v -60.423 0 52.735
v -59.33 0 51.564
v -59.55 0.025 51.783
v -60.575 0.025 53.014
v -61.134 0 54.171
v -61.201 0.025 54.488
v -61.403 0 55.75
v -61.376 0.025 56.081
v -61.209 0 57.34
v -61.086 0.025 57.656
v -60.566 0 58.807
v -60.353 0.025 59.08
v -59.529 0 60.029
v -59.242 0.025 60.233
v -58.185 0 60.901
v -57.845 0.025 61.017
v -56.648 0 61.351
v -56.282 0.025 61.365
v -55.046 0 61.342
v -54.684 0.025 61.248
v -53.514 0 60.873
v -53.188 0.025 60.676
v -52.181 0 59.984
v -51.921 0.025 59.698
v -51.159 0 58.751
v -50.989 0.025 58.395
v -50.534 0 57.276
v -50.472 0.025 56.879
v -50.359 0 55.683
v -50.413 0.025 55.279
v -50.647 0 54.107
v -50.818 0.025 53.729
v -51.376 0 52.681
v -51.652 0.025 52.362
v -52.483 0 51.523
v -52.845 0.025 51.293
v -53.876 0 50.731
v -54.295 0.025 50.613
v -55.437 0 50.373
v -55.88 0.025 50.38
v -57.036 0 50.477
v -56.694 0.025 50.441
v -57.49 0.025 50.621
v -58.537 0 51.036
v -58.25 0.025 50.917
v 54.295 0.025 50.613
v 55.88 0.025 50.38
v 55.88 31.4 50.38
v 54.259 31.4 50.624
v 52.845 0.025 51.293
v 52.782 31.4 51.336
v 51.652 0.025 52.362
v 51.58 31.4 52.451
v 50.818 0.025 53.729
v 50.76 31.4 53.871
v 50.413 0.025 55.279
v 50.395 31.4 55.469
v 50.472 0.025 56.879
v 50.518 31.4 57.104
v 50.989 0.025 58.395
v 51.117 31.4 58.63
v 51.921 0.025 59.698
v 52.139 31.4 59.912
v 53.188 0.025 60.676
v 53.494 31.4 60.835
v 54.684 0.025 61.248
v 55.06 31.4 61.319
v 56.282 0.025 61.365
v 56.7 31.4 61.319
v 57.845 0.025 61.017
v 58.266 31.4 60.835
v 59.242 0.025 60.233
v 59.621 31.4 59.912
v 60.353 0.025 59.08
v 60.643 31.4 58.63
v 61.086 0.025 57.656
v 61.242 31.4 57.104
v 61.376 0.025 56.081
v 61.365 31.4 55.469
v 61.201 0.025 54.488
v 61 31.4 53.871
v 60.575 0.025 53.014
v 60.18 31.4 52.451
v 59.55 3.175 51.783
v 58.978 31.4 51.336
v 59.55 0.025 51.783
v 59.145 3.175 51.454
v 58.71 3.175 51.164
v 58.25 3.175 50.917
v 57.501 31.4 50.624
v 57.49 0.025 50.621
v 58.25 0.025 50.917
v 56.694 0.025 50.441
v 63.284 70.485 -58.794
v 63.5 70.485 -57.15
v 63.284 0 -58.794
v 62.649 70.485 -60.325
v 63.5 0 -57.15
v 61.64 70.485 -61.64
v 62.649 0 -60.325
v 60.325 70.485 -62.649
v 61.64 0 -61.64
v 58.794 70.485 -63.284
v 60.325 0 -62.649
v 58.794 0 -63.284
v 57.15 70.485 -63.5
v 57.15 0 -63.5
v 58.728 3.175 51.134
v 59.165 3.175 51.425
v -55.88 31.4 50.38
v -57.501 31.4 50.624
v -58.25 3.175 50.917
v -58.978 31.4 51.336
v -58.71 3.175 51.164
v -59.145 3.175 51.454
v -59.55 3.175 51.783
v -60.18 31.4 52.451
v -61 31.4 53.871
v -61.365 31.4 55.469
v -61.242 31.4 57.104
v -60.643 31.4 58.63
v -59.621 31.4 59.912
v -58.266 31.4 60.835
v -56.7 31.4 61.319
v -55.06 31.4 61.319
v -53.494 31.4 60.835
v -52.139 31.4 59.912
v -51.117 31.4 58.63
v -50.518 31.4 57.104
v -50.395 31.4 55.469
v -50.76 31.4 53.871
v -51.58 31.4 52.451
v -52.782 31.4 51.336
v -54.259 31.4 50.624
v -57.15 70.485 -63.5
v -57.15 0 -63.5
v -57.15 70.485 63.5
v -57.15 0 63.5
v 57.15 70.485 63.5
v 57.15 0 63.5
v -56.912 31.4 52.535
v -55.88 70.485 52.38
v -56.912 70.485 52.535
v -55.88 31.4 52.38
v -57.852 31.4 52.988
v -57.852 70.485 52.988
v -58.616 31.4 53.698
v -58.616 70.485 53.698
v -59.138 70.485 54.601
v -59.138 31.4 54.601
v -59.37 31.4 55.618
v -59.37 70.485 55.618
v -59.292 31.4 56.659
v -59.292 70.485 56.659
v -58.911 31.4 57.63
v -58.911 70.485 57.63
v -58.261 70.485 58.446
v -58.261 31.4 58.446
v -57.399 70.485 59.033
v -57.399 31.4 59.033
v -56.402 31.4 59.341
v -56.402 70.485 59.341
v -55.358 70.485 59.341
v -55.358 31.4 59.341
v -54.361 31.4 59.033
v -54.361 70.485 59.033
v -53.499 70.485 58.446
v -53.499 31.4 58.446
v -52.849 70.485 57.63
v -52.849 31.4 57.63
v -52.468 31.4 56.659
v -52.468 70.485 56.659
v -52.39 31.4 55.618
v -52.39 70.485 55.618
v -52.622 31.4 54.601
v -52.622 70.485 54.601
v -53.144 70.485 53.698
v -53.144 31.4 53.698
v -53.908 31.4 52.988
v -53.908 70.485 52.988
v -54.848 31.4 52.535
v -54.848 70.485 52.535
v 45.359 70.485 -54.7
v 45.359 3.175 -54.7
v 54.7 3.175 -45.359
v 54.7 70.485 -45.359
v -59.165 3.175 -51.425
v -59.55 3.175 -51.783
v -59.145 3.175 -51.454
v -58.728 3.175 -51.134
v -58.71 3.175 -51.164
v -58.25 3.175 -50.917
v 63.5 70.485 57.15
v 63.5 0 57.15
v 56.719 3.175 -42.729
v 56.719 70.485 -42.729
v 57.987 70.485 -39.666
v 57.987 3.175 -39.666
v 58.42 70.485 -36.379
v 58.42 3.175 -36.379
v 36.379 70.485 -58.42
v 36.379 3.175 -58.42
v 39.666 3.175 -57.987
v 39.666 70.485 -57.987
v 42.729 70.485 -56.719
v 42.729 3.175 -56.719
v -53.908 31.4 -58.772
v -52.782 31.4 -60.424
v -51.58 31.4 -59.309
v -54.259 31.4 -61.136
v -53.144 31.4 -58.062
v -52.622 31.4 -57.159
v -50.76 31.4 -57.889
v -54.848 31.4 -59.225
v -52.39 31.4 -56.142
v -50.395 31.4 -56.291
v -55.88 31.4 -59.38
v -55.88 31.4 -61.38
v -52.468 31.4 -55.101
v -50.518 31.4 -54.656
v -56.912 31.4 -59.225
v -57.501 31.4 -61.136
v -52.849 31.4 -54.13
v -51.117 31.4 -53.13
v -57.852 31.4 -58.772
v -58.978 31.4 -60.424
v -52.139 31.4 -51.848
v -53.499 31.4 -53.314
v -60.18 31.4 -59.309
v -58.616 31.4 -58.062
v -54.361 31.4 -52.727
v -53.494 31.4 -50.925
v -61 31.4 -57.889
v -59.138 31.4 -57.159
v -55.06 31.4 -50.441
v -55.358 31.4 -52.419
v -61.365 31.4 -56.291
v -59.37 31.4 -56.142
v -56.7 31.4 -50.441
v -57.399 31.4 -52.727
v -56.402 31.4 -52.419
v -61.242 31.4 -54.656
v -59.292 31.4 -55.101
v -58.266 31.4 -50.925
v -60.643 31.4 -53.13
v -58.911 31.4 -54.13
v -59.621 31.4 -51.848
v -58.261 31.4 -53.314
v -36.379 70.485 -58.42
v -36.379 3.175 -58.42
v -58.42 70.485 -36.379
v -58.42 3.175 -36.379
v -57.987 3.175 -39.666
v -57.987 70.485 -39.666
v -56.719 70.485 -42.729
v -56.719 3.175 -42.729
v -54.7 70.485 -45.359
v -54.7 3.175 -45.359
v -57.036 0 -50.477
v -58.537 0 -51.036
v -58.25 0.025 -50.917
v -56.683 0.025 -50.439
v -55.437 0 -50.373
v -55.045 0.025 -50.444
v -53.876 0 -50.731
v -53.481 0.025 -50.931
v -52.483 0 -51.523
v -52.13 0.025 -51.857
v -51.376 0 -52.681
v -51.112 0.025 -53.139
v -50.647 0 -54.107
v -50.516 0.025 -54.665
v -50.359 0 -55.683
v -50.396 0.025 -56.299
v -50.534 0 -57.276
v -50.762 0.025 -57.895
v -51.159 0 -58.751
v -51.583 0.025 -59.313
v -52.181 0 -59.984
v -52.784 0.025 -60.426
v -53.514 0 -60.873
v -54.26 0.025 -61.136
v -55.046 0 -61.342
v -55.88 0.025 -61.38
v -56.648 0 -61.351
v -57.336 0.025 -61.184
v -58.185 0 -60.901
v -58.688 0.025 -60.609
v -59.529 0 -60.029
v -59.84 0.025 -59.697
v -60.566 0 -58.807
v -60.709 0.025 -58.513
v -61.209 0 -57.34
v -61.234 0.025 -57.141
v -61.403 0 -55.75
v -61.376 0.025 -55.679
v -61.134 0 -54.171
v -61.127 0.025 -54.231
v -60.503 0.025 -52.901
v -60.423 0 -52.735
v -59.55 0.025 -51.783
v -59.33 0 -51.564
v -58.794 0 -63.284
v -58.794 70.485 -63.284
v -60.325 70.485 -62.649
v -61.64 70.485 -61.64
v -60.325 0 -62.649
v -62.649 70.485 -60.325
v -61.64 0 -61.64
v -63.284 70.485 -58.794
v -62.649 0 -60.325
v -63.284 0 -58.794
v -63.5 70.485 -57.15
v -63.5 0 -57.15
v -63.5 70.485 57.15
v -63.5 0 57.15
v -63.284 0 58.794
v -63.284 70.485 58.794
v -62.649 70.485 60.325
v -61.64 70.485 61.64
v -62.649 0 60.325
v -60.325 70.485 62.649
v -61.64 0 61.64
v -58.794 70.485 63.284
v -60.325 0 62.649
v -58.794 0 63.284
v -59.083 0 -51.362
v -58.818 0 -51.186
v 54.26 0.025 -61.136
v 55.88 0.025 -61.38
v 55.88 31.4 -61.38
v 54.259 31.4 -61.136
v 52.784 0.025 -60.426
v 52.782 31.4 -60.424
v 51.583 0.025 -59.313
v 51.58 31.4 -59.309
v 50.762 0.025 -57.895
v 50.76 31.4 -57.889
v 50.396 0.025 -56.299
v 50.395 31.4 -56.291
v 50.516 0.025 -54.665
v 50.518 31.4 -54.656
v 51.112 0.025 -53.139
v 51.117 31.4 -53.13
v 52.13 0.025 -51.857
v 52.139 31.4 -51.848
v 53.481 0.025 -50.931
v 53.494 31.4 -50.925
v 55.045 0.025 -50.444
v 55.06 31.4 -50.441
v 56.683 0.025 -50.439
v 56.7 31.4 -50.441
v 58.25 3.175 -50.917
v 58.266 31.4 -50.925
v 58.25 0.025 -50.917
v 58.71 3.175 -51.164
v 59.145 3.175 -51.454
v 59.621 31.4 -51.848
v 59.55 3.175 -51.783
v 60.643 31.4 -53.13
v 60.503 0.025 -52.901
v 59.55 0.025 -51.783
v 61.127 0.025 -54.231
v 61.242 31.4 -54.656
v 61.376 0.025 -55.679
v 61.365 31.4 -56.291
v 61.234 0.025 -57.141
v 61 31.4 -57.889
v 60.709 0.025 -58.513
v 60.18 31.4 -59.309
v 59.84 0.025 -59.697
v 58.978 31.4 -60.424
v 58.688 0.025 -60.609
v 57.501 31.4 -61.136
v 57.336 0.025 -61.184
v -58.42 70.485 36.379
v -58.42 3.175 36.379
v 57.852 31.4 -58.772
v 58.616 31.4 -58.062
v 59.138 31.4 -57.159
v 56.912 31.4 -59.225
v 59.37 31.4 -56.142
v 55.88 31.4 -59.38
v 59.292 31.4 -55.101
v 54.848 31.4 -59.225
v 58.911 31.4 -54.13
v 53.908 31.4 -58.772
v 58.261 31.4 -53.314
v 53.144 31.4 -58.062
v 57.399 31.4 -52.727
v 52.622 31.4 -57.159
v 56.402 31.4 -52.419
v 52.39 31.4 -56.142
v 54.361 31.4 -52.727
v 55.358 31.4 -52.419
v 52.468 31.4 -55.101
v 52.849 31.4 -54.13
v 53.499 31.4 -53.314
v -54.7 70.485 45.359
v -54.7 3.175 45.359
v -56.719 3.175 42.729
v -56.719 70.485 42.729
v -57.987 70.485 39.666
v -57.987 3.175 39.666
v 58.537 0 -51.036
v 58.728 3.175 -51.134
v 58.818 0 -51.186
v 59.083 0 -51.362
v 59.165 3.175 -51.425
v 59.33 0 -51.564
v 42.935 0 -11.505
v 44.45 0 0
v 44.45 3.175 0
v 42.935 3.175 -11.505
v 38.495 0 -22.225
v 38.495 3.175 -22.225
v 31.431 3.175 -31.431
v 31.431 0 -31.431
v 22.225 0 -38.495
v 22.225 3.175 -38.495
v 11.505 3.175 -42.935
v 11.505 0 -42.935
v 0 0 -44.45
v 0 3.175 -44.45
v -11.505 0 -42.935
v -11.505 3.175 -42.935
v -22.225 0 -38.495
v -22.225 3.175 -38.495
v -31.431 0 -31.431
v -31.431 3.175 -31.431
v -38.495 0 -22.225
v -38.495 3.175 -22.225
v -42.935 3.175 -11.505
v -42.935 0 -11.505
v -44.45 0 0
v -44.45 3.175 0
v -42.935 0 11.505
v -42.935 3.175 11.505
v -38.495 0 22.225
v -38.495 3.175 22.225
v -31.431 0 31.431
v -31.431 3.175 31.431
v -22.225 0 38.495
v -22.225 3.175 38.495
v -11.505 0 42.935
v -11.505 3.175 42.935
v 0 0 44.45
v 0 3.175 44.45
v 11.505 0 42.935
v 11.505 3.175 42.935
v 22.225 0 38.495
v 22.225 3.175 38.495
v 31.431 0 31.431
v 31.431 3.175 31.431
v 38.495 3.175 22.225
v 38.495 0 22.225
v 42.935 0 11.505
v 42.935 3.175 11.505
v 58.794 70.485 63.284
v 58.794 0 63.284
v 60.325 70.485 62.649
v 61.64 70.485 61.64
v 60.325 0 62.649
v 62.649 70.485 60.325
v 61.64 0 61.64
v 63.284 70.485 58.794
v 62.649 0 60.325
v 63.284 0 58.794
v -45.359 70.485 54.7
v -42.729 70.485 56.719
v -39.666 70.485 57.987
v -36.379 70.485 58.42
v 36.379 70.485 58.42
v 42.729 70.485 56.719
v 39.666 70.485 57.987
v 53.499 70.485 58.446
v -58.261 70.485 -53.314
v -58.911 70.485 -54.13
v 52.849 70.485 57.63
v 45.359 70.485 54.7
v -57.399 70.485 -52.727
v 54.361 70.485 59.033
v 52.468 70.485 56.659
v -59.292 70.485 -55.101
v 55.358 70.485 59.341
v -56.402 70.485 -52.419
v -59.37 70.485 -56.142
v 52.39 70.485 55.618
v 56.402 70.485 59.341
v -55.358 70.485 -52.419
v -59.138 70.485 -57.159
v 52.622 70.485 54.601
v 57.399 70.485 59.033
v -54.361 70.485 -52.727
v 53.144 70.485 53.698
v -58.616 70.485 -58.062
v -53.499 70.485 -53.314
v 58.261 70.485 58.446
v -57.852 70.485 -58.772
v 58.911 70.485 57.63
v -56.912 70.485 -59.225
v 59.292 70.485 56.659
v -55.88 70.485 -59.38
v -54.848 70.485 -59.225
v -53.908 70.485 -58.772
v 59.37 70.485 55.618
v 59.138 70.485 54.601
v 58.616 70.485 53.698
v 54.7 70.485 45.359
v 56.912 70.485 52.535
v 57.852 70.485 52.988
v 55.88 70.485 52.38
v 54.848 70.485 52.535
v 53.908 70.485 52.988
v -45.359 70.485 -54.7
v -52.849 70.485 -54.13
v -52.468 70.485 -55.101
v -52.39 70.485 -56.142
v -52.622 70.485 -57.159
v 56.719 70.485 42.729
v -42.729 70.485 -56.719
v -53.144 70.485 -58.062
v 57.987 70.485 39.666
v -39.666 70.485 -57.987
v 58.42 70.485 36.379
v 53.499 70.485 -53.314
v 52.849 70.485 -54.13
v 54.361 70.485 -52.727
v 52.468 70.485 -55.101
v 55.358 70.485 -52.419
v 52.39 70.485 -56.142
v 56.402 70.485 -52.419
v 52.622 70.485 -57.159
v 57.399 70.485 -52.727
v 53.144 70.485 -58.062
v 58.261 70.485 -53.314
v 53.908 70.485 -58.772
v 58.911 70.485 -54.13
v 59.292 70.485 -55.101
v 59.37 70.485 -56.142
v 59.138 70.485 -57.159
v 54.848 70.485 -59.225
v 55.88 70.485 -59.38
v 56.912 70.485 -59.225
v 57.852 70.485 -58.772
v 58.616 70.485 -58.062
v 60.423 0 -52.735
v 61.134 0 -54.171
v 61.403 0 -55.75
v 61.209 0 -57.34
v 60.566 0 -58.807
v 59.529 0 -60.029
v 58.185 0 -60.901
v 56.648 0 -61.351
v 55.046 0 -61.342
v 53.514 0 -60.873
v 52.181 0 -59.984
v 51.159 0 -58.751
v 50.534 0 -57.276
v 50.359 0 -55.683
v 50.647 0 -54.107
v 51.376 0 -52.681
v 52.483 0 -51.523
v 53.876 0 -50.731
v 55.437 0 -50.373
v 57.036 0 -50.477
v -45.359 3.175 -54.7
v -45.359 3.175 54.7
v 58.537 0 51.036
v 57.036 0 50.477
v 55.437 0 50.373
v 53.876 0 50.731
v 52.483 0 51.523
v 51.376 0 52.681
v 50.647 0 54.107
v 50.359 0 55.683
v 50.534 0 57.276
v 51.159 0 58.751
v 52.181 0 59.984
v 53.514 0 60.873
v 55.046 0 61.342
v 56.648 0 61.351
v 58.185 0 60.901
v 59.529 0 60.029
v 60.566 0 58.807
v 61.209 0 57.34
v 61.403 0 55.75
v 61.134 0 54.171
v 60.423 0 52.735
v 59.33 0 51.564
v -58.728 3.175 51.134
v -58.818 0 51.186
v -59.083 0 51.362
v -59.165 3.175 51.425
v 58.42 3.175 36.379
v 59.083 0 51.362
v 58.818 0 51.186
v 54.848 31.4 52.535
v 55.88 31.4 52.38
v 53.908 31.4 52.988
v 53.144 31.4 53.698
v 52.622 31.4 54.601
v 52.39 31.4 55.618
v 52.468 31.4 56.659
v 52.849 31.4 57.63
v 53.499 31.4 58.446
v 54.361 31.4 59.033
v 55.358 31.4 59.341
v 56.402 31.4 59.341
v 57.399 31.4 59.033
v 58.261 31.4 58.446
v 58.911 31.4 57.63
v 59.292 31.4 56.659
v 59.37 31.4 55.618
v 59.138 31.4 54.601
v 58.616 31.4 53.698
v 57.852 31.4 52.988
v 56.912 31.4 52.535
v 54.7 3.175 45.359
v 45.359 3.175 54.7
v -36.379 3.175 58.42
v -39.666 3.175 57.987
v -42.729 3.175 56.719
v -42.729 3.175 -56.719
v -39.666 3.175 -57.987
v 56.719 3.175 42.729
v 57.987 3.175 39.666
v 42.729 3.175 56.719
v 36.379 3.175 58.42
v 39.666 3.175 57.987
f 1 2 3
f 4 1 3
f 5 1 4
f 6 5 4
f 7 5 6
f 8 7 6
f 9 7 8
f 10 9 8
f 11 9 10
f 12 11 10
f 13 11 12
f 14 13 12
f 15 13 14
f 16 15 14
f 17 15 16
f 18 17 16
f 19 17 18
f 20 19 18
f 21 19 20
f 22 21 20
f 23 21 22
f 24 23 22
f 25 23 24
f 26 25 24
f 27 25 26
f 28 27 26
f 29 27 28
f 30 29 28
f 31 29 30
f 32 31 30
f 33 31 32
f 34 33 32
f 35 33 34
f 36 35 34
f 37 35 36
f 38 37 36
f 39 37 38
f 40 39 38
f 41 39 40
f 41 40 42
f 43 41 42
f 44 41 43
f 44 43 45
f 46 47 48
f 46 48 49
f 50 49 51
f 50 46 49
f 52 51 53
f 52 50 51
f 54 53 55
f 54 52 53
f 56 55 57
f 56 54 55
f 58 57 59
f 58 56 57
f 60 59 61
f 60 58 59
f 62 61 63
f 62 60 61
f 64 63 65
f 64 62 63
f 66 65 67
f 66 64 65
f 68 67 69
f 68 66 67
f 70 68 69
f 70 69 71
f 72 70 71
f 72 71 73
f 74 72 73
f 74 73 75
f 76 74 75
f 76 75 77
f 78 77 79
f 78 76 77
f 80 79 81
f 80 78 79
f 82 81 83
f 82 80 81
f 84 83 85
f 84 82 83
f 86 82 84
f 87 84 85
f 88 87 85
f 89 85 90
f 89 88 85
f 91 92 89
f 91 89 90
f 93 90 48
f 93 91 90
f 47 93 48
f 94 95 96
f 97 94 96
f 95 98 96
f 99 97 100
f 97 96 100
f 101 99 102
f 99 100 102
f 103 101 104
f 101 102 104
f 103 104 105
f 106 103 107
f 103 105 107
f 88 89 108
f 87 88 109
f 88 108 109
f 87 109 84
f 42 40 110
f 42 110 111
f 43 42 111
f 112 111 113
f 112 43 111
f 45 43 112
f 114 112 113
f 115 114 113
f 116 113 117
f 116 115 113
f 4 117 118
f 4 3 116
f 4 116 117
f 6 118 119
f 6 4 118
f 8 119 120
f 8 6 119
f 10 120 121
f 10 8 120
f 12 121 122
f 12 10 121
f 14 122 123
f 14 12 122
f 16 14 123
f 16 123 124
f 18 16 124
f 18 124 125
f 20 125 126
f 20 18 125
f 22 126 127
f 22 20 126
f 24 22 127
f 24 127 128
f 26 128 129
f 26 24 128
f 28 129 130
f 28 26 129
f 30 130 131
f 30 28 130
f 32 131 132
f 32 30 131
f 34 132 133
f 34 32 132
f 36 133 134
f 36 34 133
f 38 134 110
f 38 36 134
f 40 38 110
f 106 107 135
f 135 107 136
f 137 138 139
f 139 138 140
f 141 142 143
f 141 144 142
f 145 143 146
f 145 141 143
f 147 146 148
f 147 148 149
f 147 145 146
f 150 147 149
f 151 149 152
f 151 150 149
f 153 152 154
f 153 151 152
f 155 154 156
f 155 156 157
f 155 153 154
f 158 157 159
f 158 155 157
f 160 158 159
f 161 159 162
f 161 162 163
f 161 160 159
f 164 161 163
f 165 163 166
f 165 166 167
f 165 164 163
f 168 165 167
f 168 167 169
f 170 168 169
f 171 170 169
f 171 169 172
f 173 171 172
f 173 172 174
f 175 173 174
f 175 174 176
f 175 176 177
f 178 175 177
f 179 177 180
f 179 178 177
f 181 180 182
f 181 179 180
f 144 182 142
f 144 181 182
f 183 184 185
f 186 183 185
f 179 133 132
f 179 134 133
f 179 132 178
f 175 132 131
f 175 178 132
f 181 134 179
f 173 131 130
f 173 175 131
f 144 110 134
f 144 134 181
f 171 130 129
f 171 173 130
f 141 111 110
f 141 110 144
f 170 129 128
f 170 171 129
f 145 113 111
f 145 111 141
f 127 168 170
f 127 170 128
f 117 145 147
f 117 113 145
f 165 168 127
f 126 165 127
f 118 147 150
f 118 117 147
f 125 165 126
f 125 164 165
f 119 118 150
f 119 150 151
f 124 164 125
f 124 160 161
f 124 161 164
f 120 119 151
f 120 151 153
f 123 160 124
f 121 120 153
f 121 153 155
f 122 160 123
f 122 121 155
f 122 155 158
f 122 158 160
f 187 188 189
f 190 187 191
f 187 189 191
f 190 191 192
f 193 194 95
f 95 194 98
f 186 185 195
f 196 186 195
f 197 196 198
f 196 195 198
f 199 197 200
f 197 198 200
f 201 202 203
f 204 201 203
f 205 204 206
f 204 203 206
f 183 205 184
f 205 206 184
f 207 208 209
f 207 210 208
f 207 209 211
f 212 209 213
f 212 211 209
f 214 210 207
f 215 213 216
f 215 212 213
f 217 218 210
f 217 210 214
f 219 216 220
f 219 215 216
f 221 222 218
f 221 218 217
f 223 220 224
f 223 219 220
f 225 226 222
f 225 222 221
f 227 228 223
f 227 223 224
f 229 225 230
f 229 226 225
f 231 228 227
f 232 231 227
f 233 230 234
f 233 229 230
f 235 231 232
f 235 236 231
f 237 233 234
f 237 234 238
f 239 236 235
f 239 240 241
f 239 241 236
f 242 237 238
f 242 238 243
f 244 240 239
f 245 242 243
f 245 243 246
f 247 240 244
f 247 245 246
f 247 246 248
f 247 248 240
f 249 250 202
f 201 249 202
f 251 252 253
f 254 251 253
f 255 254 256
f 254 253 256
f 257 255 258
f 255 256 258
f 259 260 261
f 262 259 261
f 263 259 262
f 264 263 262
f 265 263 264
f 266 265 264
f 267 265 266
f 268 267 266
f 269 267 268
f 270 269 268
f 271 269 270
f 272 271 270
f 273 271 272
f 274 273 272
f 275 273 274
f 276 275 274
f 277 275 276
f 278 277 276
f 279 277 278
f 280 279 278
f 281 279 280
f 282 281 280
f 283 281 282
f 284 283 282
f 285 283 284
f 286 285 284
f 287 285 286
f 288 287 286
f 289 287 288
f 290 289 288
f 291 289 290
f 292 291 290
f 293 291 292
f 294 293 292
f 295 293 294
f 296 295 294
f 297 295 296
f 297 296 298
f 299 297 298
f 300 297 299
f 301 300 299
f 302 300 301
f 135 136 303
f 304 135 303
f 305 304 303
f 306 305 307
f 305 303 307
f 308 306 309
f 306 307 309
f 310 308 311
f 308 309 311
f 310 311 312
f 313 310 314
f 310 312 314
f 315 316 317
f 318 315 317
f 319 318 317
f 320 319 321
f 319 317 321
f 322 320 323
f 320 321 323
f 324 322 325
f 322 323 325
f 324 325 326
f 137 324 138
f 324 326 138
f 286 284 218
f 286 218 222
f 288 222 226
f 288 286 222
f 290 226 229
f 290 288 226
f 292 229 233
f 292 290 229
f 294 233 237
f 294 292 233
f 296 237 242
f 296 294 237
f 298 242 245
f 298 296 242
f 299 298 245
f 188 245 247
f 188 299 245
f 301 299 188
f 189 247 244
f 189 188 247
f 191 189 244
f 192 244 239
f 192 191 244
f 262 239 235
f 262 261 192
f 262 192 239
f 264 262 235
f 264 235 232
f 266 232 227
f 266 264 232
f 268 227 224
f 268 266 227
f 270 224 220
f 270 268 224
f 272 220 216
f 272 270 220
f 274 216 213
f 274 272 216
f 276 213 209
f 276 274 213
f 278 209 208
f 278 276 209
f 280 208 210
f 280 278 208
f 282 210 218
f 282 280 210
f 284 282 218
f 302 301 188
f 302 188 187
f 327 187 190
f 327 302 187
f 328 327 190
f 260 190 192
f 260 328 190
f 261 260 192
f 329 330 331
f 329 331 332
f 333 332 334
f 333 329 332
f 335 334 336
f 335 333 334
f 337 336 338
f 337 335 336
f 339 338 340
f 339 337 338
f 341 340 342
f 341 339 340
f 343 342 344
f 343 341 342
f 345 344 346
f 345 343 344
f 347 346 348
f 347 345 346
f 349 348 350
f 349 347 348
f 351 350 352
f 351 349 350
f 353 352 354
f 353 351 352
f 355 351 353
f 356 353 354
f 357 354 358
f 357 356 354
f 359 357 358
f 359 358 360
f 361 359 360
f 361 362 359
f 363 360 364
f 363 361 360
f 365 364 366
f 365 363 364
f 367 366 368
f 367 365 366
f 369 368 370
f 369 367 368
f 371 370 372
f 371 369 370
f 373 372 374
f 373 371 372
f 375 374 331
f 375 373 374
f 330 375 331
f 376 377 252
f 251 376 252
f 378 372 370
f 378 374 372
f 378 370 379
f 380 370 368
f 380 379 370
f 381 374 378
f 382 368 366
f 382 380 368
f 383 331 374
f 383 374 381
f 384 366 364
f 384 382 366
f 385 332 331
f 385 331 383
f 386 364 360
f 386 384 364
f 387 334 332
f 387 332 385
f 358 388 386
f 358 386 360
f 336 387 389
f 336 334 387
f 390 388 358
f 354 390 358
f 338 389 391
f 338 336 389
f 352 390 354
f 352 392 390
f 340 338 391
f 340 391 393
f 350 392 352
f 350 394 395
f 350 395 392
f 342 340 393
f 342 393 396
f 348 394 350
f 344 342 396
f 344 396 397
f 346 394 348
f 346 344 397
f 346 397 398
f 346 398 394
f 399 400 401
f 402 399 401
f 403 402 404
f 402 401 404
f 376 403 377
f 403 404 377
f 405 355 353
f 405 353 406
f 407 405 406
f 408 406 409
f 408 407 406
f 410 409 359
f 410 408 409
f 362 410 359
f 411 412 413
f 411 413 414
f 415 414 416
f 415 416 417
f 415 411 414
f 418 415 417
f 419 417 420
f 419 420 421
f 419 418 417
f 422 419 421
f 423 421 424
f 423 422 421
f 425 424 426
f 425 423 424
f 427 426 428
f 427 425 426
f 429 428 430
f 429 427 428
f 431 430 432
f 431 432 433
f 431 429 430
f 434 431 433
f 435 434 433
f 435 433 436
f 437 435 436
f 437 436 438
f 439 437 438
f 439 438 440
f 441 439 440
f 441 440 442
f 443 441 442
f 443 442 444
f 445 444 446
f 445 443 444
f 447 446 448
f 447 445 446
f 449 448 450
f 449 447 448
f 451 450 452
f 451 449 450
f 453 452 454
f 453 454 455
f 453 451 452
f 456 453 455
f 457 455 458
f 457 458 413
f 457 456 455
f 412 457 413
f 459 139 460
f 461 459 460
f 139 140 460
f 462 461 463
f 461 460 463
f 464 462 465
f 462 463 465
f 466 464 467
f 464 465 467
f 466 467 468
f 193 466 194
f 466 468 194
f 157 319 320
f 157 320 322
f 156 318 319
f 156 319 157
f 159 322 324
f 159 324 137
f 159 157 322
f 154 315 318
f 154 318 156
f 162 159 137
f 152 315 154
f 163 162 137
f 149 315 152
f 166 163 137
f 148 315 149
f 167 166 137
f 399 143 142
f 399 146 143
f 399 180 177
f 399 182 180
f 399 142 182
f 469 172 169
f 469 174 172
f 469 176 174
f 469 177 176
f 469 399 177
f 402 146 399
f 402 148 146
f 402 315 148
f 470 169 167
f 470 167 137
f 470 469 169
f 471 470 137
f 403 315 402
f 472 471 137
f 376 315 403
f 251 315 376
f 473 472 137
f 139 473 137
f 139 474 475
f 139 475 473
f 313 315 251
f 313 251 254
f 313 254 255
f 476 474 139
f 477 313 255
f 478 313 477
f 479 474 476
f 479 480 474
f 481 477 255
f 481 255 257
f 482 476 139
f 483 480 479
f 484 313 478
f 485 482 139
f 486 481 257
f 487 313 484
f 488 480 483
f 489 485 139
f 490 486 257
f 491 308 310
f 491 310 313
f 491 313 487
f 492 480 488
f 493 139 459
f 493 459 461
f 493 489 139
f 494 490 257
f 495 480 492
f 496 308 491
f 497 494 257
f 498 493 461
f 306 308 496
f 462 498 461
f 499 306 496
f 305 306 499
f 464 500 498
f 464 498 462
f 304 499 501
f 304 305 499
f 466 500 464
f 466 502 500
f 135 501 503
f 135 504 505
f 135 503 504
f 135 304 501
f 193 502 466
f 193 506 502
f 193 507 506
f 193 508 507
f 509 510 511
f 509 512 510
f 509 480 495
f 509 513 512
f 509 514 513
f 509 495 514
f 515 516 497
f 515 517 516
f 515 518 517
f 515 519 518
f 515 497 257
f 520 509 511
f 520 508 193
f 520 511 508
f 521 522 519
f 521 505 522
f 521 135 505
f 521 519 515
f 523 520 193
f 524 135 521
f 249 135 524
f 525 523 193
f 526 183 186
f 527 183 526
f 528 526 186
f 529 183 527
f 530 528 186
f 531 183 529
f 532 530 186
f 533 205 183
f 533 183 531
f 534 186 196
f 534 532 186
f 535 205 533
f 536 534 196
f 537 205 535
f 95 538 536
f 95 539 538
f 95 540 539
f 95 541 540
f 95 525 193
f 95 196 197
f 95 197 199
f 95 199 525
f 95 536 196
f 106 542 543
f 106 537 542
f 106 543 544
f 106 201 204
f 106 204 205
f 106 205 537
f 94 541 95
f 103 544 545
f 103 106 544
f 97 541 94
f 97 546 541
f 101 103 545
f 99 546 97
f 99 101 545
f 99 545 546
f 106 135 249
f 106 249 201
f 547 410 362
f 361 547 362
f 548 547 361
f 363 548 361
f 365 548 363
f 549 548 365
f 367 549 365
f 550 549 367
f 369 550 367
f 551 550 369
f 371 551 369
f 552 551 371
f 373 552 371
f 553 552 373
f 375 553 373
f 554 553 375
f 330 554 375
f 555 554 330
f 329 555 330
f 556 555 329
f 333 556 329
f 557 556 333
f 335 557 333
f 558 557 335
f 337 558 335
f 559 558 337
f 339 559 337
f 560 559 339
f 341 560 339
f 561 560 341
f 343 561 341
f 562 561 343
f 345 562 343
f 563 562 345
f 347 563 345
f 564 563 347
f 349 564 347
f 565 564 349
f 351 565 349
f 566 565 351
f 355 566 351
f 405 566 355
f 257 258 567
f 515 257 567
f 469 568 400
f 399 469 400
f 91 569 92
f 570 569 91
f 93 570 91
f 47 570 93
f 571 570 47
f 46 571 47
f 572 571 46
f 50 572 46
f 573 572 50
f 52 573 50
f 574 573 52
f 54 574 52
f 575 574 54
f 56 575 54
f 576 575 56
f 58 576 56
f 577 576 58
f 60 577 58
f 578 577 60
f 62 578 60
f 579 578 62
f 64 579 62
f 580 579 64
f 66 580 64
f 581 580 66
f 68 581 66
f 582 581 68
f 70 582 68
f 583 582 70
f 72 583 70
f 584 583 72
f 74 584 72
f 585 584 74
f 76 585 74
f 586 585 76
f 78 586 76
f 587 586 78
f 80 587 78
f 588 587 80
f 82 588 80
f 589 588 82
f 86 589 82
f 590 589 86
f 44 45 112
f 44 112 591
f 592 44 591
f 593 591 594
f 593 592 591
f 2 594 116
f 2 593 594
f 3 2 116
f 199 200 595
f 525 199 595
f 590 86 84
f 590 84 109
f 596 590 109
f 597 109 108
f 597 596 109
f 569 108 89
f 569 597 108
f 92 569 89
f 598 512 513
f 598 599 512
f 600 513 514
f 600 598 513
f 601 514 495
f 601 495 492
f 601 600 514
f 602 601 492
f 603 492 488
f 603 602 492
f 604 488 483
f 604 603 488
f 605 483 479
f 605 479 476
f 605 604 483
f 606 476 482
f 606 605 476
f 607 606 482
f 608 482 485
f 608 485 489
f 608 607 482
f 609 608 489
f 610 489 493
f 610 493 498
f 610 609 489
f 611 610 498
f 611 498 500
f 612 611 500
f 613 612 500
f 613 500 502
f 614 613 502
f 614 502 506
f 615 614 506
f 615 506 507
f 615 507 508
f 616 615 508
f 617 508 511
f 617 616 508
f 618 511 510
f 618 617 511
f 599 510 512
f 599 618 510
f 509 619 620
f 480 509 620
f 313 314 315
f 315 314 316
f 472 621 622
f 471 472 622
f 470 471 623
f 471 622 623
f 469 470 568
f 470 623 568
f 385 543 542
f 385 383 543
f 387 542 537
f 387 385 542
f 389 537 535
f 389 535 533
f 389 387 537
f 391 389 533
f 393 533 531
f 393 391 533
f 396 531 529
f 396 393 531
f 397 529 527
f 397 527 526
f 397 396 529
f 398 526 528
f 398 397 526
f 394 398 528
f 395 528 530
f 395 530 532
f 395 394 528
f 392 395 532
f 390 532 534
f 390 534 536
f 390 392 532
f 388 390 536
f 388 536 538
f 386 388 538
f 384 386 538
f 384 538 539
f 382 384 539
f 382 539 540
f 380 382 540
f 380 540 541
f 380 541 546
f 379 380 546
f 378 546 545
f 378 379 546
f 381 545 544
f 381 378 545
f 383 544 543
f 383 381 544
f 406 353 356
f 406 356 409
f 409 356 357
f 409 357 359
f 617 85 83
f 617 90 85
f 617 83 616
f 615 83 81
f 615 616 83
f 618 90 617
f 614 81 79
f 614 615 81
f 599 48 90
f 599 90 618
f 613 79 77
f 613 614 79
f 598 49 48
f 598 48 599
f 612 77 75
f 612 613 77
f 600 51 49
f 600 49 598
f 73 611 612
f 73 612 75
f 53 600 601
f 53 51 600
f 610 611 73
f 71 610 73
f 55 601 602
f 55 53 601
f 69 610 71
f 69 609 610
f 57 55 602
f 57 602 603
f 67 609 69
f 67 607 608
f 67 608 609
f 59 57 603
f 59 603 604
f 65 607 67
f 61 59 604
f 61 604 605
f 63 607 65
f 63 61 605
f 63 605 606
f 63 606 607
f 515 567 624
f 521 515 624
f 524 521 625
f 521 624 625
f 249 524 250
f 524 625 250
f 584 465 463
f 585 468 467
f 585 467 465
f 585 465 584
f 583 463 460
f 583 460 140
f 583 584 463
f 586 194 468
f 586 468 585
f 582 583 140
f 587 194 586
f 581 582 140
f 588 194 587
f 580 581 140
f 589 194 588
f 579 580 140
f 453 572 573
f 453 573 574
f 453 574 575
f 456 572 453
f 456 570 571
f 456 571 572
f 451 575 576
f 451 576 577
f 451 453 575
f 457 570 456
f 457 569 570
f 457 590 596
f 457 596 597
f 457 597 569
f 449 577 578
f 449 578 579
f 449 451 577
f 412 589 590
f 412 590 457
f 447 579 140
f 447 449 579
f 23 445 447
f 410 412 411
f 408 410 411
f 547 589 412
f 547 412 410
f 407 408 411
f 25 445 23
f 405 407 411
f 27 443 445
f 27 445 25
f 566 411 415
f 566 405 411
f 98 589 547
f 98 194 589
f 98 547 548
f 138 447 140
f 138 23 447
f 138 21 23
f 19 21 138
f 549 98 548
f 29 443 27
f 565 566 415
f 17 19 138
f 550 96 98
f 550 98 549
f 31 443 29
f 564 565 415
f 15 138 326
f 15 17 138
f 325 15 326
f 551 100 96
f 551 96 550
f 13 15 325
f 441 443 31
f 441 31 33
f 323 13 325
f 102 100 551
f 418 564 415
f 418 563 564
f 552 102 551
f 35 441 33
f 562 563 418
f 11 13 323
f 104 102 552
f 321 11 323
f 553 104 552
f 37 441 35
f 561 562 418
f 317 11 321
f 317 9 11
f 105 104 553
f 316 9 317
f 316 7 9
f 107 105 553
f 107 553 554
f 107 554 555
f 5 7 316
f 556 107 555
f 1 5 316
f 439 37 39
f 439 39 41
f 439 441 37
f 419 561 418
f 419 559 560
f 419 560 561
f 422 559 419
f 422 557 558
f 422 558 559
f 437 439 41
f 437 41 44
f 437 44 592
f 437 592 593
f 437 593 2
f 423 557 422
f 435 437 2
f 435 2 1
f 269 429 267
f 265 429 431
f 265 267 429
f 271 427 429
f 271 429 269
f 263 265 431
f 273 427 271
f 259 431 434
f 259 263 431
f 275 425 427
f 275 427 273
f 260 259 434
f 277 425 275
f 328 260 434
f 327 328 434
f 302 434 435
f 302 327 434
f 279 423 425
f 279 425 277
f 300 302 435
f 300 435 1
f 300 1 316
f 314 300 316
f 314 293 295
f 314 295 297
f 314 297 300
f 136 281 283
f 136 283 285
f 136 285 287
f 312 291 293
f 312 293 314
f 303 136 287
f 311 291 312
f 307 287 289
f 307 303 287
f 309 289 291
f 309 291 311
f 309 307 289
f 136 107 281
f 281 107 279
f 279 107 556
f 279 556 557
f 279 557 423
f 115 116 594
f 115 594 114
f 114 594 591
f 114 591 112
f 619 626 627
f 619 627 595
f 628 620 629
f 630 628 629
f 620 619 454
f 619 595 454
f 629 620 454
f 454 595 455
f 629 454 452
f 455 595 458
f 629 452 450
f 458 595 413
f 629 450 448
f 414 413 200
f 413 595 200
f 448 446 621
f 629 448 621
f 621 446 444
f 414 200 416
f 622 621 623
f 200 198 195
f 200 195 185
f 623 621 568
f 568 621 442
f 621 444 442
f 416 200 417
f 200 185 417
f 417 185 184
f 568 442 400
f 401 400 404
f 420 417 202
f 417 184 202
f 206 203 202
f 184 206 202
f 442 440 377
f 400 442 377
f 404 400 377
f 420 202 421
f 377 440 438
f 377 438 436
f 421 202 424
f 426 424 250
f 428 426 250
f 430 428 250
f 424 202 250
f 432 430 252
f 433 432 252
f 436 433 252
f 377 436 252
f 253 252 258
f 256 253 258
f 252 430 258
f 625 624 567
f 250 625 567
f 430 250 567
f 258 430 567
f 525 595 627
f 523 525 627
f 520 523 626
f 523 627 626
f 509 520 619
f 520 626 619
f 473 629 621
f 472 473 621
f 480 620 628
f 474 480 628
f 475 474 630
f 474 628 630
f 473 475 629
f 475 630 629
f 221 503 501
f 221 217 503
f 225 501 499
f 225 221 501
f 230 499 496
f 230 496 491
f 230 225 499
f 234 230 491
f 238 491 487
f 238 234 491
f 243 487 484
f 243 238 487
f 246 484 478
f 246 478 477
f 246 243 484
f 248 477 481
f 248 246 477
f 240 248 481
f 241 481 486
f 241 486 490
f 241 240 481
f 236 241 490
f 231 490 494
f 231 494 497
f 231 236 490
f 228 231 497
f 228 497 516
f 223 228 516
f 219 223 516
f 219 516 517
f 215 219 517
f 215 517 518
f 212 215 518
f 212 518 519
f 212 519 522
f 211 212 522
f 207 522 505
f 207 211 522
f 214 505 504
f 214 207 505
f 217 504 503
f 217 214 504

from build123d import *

# Parameters (mm, degrees)
SKETCH1_R                     = 44.45
SKETCH1_R_2                   = 3.25
BOSS_EXTRUDE1_DEPTH           = 3.175
BOSS_EXTRUDE2_DEPTH           = 67.31
CBORE_FOR_M6_SHCS2_AT_2_COUNT = 2
CBORE_FOR_M6_SHCS2_AT_2_PITCH = 111.76
CBORE_FOR_M6_SHCS2_AT_3_COUNT = 2
CBORE_FOR_M6_SHCS2_AT_3_PITCH = 158.052507731
CBORE_FOR_M6_SHCS2_AT_4_COUNT = 2
CBORE_FOR_M6_SHCS2_AT_4_PITCH = 111.76


with BuildPart() as part:
    # Sketch1 → Boss-Extrude1 (new body)
    with BuildSketch(Plane(origin=(0, 0, 0), x_dir=(1, 0, 0), z_dir=(0, 1, 0))):
        with BuildLine():
            Line((-57.15, 63.5), (57.15, 63.5))
            ThreePointArc((57.15, 63.5), (61.640128061, 61.640128061), (63.5, 57.15))
            Line((63.5, 57.15), (63.5, -57.15))
            ThreePointArc((63.5, -57.15), (61.640128061, -61.640128061), (57.15, -63.5))
            Line((57.15, -63.5), (-57.15, -63.5))
            ThreePointArc((-57.15, -63.5), (-61.640128061, -61.640128061), (-63.5, -57.15))
            Line((-63.5, -57.15), (-63.5, 57.15))
            ThreePointArc((-63.5, 57.15), (-61.640128061, 61.640128061), (-57.15, 63.5))
        make_face()
        Circle(SKETCH1_R, mode=Mode.SUBTRACT)
        with Locations((-57.15, 53.975)):
            Circle(SKETCH1_R_2, mode=Mode.SUBTRACT)
        with Locations((57.15, 53.975)):
            Circle(SKETCH1_R_2, mode=Mode.SUBTRACT)
        with Locations((57.15, -53.975)):
            Circle(SKETCH1_R_2, mode=Mode.SUBTRACT)
        with Locations((-57.15, -53.975)):
            Circle(SKETCH1_R_2, mode=Mode.SUBTRACT)
    extrude(amount=BOSS_EXTRUDE1_DEPTH)

    # Sketch3 → Boss-Extrude2 (add)
    with BuildSketch(Plane(origin=(0, 3.175, 0), x_dir=(1, 0, 0), z_dir=(0, 1, 0))):
        with BuildLine():
            Line((-57.15, -63.5), (57.15, -63.5))
            ThreePointArc((57.15, -63.5), (61.640128061, -61.640128061), (63.5, -57.15))
            Line((63.5, -57.15), (63.5, 57.15))
            ThreePointArc((63.5, 57.15), (61.640128061, 61.640128061), (57.15, 63.5))
            Line((57.15, 63.5), (-57.15, 63.5))
            ThreePointArc((-57.15, 63.5), (-61.640128061, 61.640128061), (-63.5, 57.15))
            Line((-63.5, 57.15), (-63.5, -57.15))
            ThreePointArc((-63.5, -57.15), (-61.640128061, -61.640128061), (-57.15, -63.5))
        make_face()
        with BuildLine():
            Line((-54.700256121, 45.358975516), (-45.358975516, 54.700256121))
            ThreePointArc((-45.358975516, 54.700256121), (-41.238798986, 57.453270063), (-36.378719395, 58.42))
            Line((-36.378719395, 58.42), (36.378719395, 58.42))
            ThreePointArc((36.378719395, 58.42), (41.238798986, 57.453270063), (45.358975516, 54.700256121))
            Line((45.358975516, 54.700256121), (54.700256121, 45.358975516))
            ThreePointArc((54.700256121, 45.358975516), (57.453270063, 41.238798986), (58.42, 36.378719395))
            Line((58.42, 36.378719395), (58.42, -36.378719395))
            ThreePointArc((58.42, -36.378719395), (57.453270063, -41.238798986), (54.700256121, -45.358975516))
            Line((54.700256121, -45.358975516), (45.358975516, -54.700256121))
            ThreePointArc((45.358975516, -54.700256121), (41.238798986, -57.453270063), (36.378719395, -58.42))
            Line((36.378719395, -58.42), (-36.378719395, -58.42))
            ThreePointArc((-36.378719395, -58.42), (-41.238798986, -57.453270063), (-45.358975516, -54.700256121))
            Line((-45.358975516, -54.700256121), (-54.700256121, -45.358975516))
            ThreePointArc((-54.700256121, -45.358975516), (-57.453270063, -41.238798986), (-58.42, -36.378719395))
            Line((-58.42, -36.378719395), (-58.42, 36.378719395))
            ThreePointArc((-58.42, 36.378719395), (-57.453270063, 41.238798986), (-54.700256121, 45.358975516))
        make_face(mode=Mode.SUBTRACT)
    extrude(amount=BOSS_EXTRUDE2_DEPTH)

    # Sketch9 → CBORE for M6 SHCS2 (revolve, cut)
    with BuildSketch(Plane(origin=(55.88, 0, -55.88), x_dir=(0, 0, -1), z_dir=(1, 0, 0))):
        Polygon((0, 0), (0, 70.485), (3.5, 70.485), (3.5, 31.4), (5.5, 31.4), (5.5, 0.025), (5.525, 0), align=None)
    cbore_for_m6_shcs2 = revolve(axis=Axis((55.88, -6.35, -55.88), (0, 1, 0)), mode=Mode.SUBTRACT)

    # CBORE for M6 SHCS2 at 2: CBORE for M6 SHCS2 ×2
    with Locations(*[(-i * CBORE_FOR_M6_SHCS2_AT_2_PITCH, 0, 0) for i in range(1, CBORE_FOR_M6_SHCS2_AT_2_COUNT)]):
        add(cbore_for_m6_shcs2, mode=Mode.SUBTRACT)

    # CBORE for M6 SHCS2 at 3: CBORE for M6 SHCS2 ×2
    with Locations(*[Vector(-0.707106781, 0, 0.707106781) * (i * CBORE_FOR_M6_SHCS2_AT_3_PITCH) for i in range(1, CBORE_FOR_M6_SHCS2_AT_3_COUNT)]):
        add(cbore_for_m6_shcs2, mode=Mode.SUBTRACT)

    # CBORE for M6 SHCS2 at 4: CBORE for M6 SHCS2 ×2
    with Locations(*[(0, 0, i * CBORE_FOR_M6_SHCS2_AT_4_PITCH) for i in range(1, CBORE_FOR_M6_SHCS2_AT_4_COUNT)]):
        add(cbore_for_m6_shcs2, mode=Mode.SUBTRACT)


solid = part.part
